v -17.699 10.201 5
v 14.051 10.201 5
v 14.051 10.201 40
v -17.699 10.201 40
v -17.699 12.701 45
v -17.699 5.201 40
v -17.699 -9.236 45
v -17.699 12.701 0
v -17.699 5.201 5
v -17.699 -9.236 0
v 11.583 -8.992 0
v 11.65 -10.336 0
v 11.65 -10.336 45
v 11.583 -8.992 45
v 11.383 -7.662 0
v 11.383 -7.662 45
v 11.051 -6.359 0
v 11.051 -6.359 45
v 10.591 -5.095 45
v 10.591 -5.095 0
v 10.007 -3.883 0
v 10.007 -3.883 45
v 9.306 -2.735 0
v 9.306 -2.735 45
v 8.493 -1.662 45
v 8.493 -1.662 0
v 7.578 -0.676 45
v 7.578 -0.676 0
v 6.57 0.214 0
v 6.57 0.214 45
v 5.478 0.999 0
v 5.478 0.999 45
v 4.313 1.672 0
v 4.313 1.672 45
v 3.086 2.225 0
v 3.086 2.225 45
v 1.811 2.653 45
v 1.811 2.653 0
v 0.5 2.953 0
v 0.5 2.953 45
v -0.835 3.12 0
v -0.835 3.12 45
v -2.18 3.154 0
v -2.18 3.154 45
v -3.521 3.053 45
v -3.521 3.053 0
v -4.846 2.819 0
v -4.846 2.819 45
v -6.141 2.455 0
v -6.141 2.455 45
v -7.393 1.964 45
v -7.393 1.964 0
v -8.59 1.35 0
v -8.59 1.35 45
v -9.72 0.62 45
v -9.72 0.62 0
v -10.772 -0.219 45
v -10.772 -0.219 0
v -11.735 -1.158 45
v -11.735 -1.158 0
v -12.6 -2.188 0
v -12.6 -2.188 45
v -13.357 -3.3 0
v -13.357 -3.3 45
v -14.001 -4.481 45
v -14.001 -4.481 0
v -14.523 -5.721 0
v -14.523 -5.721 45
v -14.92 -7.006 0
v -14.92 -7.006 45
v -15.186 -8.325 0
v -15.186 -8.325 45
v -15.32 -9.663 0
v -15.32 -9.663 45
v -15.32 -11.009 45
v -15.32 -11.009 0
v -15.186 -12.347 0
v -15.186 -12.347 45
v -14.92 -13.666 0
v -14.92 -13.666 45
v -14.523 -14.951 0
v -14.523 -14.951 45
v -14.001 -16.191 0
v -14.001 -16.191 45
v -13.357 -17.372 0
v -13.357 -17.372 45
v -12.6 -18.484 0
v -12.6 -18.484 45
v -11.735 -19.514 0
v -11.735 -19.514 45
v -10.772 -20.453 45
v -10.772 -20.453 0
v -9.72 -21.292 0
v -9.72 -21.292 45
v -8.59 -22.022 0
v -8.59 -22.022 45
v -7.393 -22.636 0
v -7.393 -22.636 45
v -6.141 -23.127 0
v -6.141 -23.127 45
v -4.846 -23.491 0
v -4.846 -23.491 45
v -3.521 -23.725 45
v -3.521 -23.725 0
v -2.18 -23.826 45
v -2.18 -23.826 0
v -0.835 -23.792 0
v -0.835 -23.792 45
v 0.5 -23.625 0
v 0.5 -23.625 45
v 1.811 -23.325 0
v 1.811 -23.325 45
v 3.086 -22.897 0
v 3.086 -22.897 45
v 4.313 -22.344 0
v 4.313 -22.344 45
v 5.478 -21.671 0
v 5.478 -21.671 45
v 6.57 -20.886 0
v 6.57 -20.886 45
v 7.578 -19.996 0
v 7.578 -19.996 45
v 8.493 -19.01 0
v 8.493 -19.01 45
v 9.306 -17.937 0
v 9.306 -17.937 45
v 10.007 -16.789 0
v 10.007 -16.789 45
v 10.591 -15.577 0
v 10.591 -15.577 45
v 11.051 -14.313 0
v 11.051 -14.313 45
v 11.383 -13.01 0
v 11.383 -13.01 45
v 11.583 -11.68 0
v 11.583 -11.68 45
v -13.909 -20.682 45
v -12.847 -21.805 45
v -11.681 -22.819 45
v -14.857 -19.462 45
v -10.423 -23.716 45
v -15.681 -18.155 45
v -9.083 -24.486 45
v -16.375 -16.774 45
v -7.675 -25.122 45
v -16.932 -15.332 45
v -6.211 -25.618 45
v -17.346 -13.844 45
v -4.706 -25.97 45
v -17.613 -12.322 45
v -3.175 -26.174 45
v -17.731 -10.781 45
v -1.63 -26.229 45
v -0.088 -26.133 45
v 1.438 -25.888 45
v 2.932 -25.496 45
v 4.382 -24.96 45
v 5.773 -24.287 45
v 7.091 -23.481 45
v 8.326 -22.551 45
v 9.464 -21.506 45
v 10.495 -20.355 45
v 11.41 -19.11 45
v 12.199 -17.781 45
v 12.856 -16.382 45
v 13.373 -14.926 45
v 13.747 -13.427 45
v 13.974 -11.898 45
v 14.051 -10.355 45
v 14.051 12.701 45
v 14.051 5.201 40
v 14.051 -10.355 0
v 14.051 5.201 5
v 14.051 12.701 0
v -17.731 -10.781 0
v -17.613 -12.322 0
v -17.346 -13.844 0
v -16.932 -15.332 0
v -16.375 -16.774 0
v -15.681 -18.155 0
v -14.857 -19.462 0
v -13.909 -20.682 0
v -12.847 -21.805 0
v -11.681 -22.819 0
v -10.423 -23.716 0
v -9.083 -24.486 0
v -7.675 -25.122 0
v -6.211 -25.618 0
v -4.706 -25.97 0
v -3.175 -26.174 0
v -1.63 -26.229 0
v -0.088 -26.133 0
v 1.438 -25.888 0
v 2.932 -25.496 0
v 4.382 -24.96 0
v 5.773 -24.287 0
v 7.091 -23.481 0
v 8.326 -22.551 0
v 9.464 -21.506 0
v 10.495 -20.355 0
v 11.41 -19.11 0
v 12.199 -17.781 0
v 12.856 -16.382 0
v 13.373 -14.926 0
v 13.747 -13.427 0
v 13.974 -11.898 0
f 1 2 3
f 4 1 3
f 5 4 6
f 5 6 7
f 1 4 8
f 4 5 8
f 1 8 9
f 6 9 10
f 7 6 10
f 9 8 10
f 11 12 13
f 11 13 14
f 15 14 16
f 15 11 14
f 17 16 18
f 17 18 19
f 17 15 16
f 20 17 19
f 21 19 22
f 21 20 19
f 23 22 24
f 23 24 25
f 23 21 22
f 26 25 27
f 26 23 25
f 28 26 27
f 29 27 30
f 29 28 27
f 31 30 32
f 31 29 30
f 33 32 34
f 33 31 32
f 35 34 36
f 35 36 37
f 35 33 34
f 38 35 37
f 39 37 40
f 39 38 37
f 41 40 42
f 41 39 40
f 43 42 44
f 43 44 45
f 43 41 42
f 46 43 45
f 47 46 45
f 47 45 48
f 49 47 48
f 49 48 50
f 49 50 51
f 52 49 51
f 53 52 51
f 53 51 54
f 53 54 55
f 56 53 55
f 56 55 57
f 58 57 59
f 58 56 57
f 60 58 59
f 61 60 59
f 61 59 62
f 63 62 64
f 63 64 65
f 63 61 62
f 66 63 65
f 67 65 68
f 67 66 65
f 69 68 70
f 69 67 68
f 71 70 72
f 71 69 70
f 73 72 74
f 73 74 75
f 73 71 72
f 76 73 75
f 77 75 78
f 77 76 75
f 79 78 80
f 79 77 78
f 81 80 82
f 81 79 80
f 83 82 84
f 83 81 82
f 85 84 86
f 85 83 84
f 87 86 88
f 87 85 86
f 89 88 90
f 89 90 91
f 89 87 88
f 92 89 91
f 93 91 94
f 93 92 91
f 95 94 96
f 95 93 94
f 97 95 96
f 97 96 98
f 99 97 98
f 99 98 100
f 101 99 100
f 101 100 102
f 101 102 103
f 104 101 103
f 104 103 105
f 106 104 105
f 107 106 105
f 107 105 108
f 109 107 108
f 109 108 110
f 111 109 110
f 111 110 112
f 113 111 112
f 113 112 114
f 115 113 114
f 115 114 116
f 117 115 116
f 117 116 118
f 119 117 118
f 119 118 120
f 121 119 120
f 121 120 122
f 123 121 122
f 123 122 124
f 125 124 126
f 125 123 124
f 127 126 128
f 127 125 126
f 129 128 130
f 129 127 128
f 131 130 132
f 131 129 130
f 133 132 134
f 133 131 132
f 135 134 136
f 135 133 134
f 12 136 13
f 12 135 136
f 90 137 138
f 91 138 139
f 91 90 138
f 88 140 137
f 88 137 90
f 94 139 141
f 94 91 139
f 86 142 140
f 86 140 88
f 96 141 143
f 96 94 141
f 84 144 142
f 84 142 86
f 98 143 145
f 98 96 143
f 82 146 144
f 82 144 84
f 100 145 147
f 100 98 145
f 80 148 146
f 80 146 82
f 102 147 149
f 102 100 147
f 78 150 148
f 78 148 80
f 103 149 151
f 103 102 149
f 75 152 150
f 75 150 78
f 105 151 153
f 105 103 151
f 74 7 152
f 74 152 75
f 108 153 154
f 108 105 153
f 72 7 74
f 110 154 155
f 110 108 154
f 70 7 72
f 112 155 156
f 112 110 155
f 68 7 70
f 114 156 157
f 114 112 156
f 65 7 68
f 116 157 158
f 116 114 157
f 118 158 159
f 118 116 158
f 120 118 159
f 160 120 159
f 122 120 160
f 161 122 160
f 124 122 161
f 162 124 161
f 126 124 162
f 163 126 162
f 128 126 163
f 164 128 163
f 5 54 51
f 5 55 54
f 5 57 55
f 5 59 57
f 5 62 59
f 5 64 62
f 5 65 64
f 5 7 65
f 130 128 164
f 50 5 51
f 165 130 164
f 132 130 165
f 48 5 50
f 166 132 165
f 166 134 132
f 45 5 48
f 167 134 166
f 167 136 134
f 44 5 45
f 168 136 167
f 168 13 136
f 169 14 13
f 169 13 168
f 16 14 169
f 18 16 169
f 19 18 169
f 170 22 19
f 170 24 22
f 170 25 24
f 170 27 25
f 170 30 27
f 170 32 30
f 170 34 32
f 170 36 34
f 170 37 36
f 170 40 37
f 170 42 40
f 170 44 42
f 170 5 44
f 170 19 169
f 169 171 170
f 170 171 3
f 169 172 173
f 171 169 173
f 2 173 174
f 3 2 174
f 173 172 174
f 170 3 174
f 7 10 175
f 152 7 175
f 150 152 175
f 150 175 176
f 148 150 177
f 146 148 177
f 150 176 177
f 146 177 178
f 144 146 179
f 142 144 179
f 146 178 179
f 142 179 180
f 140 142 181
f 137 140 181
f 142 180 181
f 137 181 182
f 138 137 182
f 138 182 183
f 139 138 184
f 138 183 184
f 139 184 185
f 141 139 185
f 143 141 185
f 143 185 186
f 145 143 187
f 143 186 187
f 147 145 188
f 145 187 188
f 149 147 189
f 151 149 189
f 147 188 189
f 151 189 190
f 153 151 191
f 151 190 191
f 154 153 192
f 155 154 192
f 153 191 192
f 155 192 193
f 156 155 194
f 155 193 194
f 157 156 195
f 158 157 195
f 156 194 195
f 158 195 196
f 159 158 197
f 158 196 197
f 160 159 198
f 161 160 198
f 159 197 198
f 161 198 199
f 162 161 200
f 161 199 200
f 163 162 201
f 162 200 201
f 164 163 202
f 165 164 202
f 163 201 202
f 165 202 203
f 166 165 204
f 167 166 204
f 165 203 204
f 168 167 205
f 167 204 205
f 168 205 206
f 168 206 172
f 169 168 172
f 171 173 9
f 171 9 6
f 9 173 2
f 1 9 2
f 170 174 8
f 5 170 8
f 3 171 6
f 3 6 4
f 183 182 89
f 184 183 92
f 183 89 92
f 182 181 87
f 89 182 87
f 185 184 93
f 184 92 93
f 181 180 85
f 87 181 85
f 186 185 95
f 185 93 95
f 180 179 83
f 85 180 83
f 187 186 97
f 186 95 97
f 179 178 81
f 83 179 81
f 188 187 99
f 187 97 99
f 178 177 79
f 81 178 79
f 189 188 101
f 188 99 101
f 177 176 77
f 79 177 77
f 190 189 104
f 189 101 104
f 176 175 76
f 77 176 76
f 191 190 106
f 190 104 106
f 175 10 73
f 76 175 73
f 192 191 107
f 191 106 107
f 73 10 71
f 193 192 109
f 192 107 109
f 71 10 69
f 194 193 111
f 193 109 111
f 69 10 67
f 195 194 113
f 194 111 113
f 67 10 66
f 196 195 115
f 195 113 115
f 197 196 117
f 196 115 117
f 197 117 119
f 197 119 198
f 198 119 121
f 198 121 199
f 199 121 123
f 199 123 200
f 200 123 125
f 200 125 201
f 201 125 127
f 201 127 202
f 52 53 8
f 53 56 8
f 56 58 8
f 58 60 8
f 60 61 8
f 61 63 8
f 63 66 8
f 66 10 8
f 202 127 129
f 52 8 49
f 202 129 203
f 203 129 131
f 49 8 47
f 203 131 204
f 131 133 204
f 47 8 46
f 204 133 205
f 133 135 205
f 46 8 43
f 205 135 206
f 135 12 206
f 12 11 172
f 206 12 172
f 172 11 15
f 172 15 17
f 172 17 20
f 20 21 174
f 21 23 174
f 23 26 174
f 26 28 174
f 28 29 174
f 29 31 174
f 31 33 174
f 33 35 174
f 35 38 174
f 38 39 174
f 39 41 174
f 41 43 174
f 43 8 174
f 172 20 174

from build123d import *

# Parameters (mm, degrees)
F0_R     = 13.49375
F1_DEPTH = 45
F2_W     = 5
F2_H     = 35
F3_DEPTH = 33.8074


with BuildPart() as f1:
    # F0 (on Top) → F1 (new body)
    with BuildSketch(Plane.XY):
        with BuildLine():
            Line((14.050669, 12.700597), (-17.699331, 12.700597))
            Line((-17.699331, 12.700597), (-17.699331, -9.235959))
            ThreePointArc((-17.699331, -9.235959), (-2.403239, -26.220174), (14.050669, -10.355026))
            Line((14.050669, -10.355026), (14.050669, -10.316926))
            Line((14.050669, -10.316926), (14.050669, 12.700597))
        make_face()
        with Locations((-1.843381, -10.335976)):
            Circle(F0_R, mode=Mode.SUBTRACT)
    extrude(amount=F1_DEPTH)

    # F2 (on face) → F3 (cut)
    with BuildSketch(Plane.YZ.offset(14.050669)):
        with Locations((7.700597, 22.5)):
            Rectangle(F2_W, F2_H)
    extrude(amount=-F3_DEPTH, mode=Mode.SUBTRACT)


solid = f1.part
